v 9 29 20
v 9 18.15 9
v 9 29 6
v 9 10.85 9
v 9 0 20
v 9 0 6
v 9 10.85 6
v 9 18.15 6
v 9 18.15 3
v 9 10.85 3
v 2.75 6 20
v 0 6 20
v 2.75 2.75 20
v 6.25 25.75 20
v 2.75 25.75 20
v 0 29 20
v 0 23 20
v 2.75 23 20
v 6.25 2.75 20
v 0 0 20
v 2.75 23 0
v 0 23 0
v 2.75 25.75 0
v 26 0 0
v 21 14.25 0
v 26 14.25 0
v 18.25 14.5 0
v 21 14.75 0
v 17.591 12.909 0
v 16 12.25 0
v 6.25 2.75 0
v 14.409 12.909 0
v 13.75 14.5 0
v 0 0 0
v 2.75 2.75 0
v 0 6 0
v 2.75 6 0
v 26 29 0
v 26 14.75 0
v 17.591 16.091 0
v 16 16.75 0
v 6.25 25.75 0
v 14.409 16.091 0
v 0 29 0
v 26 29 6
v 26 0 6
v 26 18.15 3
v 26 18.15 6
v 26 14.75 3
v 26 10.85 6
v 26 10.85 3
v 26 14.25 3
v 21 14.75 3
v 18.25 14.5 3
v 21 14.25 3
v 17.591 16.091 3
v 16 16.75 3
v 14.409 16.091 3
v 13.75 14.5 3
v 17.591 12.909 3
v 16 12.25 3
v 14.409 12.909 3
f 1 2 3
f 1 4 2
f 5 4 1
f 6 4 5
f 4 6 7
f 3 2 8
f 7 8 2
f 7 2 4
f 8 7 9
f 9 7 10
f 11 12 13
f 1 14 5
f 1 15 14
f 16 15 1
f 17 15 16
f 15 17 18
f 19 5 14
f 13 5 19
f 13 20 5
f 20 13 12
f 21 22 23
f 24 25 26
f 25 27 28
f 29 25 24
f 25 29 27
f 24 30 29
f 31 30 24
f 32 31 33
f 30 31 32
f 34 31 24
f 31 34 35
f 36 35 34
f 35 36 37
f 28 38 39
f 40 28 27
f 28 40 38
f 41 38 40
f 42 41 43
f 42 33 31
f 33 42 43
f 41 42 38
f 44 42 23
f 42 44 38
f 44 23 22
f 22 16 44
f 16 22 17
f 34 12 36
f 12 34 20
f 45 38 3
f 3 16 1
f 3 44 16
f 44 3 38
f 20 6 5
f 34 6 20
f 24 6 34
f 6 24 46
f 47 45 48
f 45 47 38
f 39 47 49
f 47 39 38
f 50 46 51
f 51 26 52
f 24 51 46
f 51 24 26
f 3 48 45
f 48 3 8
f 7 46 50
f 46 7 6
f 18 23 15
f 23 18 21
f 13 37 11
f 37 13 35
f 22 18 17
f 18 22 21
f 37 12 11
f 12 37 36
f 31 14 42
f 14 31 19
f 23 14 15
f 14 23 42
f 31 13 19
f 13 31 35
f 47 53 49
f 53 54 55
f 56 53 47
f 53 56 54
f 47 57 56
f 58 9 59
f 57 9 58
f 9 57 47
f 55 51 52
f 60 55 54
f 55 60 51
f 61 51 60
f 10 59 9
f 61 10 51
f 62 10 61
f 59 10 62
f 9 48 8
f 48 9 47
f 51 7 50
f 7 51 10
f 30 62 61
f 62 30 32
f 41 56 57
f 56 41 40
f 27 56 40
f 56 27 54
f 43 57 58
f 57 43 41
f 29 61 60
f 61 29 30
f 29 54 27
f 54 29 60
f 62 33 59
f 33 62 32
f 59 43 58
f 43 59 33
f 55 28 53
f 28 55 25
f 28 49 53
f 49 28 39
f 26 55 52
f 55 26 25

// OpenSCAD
a = 6; // Gap between bars
b = 20; // width of the bars
c = 29; // Width of whole thing
d = 24; // Width of slot
e = 3; // Outside wall thickness, and 45 degree area width
f = 200; // length of bar this must be in center of
g = 4; // Slot width for cable tie
h = 20; // Slide length
i = 4.5; // Screw hole diameter
j = 6.8; // Nut width
k = 0.5; // Slot for line
t = 0.25; // tolerance



difference() {
    // Main shape
    union() {
        cube([3*e,c,b]);
        translate([2*e,0,0]) cube([b,c,2*e]);
        // Slot to fit adjustment strip
    }
    // slot for slider
    translate([0,2*e,0]) cube([e-t,c-4*e,b]);
    translate([e-t,e-t,0]) cube([t+e+t,c-2*e,b]);

    translate([3*e,(c-j)/2-t,e]) cube([b,j+2*t,2*e]);
    translate([2*e+10,c/2,e]) cylinder(b,r=i/2,center=true);
    translate([2*e+10+5,(c-k)/2,0]) cube([b,k,b]);
}
